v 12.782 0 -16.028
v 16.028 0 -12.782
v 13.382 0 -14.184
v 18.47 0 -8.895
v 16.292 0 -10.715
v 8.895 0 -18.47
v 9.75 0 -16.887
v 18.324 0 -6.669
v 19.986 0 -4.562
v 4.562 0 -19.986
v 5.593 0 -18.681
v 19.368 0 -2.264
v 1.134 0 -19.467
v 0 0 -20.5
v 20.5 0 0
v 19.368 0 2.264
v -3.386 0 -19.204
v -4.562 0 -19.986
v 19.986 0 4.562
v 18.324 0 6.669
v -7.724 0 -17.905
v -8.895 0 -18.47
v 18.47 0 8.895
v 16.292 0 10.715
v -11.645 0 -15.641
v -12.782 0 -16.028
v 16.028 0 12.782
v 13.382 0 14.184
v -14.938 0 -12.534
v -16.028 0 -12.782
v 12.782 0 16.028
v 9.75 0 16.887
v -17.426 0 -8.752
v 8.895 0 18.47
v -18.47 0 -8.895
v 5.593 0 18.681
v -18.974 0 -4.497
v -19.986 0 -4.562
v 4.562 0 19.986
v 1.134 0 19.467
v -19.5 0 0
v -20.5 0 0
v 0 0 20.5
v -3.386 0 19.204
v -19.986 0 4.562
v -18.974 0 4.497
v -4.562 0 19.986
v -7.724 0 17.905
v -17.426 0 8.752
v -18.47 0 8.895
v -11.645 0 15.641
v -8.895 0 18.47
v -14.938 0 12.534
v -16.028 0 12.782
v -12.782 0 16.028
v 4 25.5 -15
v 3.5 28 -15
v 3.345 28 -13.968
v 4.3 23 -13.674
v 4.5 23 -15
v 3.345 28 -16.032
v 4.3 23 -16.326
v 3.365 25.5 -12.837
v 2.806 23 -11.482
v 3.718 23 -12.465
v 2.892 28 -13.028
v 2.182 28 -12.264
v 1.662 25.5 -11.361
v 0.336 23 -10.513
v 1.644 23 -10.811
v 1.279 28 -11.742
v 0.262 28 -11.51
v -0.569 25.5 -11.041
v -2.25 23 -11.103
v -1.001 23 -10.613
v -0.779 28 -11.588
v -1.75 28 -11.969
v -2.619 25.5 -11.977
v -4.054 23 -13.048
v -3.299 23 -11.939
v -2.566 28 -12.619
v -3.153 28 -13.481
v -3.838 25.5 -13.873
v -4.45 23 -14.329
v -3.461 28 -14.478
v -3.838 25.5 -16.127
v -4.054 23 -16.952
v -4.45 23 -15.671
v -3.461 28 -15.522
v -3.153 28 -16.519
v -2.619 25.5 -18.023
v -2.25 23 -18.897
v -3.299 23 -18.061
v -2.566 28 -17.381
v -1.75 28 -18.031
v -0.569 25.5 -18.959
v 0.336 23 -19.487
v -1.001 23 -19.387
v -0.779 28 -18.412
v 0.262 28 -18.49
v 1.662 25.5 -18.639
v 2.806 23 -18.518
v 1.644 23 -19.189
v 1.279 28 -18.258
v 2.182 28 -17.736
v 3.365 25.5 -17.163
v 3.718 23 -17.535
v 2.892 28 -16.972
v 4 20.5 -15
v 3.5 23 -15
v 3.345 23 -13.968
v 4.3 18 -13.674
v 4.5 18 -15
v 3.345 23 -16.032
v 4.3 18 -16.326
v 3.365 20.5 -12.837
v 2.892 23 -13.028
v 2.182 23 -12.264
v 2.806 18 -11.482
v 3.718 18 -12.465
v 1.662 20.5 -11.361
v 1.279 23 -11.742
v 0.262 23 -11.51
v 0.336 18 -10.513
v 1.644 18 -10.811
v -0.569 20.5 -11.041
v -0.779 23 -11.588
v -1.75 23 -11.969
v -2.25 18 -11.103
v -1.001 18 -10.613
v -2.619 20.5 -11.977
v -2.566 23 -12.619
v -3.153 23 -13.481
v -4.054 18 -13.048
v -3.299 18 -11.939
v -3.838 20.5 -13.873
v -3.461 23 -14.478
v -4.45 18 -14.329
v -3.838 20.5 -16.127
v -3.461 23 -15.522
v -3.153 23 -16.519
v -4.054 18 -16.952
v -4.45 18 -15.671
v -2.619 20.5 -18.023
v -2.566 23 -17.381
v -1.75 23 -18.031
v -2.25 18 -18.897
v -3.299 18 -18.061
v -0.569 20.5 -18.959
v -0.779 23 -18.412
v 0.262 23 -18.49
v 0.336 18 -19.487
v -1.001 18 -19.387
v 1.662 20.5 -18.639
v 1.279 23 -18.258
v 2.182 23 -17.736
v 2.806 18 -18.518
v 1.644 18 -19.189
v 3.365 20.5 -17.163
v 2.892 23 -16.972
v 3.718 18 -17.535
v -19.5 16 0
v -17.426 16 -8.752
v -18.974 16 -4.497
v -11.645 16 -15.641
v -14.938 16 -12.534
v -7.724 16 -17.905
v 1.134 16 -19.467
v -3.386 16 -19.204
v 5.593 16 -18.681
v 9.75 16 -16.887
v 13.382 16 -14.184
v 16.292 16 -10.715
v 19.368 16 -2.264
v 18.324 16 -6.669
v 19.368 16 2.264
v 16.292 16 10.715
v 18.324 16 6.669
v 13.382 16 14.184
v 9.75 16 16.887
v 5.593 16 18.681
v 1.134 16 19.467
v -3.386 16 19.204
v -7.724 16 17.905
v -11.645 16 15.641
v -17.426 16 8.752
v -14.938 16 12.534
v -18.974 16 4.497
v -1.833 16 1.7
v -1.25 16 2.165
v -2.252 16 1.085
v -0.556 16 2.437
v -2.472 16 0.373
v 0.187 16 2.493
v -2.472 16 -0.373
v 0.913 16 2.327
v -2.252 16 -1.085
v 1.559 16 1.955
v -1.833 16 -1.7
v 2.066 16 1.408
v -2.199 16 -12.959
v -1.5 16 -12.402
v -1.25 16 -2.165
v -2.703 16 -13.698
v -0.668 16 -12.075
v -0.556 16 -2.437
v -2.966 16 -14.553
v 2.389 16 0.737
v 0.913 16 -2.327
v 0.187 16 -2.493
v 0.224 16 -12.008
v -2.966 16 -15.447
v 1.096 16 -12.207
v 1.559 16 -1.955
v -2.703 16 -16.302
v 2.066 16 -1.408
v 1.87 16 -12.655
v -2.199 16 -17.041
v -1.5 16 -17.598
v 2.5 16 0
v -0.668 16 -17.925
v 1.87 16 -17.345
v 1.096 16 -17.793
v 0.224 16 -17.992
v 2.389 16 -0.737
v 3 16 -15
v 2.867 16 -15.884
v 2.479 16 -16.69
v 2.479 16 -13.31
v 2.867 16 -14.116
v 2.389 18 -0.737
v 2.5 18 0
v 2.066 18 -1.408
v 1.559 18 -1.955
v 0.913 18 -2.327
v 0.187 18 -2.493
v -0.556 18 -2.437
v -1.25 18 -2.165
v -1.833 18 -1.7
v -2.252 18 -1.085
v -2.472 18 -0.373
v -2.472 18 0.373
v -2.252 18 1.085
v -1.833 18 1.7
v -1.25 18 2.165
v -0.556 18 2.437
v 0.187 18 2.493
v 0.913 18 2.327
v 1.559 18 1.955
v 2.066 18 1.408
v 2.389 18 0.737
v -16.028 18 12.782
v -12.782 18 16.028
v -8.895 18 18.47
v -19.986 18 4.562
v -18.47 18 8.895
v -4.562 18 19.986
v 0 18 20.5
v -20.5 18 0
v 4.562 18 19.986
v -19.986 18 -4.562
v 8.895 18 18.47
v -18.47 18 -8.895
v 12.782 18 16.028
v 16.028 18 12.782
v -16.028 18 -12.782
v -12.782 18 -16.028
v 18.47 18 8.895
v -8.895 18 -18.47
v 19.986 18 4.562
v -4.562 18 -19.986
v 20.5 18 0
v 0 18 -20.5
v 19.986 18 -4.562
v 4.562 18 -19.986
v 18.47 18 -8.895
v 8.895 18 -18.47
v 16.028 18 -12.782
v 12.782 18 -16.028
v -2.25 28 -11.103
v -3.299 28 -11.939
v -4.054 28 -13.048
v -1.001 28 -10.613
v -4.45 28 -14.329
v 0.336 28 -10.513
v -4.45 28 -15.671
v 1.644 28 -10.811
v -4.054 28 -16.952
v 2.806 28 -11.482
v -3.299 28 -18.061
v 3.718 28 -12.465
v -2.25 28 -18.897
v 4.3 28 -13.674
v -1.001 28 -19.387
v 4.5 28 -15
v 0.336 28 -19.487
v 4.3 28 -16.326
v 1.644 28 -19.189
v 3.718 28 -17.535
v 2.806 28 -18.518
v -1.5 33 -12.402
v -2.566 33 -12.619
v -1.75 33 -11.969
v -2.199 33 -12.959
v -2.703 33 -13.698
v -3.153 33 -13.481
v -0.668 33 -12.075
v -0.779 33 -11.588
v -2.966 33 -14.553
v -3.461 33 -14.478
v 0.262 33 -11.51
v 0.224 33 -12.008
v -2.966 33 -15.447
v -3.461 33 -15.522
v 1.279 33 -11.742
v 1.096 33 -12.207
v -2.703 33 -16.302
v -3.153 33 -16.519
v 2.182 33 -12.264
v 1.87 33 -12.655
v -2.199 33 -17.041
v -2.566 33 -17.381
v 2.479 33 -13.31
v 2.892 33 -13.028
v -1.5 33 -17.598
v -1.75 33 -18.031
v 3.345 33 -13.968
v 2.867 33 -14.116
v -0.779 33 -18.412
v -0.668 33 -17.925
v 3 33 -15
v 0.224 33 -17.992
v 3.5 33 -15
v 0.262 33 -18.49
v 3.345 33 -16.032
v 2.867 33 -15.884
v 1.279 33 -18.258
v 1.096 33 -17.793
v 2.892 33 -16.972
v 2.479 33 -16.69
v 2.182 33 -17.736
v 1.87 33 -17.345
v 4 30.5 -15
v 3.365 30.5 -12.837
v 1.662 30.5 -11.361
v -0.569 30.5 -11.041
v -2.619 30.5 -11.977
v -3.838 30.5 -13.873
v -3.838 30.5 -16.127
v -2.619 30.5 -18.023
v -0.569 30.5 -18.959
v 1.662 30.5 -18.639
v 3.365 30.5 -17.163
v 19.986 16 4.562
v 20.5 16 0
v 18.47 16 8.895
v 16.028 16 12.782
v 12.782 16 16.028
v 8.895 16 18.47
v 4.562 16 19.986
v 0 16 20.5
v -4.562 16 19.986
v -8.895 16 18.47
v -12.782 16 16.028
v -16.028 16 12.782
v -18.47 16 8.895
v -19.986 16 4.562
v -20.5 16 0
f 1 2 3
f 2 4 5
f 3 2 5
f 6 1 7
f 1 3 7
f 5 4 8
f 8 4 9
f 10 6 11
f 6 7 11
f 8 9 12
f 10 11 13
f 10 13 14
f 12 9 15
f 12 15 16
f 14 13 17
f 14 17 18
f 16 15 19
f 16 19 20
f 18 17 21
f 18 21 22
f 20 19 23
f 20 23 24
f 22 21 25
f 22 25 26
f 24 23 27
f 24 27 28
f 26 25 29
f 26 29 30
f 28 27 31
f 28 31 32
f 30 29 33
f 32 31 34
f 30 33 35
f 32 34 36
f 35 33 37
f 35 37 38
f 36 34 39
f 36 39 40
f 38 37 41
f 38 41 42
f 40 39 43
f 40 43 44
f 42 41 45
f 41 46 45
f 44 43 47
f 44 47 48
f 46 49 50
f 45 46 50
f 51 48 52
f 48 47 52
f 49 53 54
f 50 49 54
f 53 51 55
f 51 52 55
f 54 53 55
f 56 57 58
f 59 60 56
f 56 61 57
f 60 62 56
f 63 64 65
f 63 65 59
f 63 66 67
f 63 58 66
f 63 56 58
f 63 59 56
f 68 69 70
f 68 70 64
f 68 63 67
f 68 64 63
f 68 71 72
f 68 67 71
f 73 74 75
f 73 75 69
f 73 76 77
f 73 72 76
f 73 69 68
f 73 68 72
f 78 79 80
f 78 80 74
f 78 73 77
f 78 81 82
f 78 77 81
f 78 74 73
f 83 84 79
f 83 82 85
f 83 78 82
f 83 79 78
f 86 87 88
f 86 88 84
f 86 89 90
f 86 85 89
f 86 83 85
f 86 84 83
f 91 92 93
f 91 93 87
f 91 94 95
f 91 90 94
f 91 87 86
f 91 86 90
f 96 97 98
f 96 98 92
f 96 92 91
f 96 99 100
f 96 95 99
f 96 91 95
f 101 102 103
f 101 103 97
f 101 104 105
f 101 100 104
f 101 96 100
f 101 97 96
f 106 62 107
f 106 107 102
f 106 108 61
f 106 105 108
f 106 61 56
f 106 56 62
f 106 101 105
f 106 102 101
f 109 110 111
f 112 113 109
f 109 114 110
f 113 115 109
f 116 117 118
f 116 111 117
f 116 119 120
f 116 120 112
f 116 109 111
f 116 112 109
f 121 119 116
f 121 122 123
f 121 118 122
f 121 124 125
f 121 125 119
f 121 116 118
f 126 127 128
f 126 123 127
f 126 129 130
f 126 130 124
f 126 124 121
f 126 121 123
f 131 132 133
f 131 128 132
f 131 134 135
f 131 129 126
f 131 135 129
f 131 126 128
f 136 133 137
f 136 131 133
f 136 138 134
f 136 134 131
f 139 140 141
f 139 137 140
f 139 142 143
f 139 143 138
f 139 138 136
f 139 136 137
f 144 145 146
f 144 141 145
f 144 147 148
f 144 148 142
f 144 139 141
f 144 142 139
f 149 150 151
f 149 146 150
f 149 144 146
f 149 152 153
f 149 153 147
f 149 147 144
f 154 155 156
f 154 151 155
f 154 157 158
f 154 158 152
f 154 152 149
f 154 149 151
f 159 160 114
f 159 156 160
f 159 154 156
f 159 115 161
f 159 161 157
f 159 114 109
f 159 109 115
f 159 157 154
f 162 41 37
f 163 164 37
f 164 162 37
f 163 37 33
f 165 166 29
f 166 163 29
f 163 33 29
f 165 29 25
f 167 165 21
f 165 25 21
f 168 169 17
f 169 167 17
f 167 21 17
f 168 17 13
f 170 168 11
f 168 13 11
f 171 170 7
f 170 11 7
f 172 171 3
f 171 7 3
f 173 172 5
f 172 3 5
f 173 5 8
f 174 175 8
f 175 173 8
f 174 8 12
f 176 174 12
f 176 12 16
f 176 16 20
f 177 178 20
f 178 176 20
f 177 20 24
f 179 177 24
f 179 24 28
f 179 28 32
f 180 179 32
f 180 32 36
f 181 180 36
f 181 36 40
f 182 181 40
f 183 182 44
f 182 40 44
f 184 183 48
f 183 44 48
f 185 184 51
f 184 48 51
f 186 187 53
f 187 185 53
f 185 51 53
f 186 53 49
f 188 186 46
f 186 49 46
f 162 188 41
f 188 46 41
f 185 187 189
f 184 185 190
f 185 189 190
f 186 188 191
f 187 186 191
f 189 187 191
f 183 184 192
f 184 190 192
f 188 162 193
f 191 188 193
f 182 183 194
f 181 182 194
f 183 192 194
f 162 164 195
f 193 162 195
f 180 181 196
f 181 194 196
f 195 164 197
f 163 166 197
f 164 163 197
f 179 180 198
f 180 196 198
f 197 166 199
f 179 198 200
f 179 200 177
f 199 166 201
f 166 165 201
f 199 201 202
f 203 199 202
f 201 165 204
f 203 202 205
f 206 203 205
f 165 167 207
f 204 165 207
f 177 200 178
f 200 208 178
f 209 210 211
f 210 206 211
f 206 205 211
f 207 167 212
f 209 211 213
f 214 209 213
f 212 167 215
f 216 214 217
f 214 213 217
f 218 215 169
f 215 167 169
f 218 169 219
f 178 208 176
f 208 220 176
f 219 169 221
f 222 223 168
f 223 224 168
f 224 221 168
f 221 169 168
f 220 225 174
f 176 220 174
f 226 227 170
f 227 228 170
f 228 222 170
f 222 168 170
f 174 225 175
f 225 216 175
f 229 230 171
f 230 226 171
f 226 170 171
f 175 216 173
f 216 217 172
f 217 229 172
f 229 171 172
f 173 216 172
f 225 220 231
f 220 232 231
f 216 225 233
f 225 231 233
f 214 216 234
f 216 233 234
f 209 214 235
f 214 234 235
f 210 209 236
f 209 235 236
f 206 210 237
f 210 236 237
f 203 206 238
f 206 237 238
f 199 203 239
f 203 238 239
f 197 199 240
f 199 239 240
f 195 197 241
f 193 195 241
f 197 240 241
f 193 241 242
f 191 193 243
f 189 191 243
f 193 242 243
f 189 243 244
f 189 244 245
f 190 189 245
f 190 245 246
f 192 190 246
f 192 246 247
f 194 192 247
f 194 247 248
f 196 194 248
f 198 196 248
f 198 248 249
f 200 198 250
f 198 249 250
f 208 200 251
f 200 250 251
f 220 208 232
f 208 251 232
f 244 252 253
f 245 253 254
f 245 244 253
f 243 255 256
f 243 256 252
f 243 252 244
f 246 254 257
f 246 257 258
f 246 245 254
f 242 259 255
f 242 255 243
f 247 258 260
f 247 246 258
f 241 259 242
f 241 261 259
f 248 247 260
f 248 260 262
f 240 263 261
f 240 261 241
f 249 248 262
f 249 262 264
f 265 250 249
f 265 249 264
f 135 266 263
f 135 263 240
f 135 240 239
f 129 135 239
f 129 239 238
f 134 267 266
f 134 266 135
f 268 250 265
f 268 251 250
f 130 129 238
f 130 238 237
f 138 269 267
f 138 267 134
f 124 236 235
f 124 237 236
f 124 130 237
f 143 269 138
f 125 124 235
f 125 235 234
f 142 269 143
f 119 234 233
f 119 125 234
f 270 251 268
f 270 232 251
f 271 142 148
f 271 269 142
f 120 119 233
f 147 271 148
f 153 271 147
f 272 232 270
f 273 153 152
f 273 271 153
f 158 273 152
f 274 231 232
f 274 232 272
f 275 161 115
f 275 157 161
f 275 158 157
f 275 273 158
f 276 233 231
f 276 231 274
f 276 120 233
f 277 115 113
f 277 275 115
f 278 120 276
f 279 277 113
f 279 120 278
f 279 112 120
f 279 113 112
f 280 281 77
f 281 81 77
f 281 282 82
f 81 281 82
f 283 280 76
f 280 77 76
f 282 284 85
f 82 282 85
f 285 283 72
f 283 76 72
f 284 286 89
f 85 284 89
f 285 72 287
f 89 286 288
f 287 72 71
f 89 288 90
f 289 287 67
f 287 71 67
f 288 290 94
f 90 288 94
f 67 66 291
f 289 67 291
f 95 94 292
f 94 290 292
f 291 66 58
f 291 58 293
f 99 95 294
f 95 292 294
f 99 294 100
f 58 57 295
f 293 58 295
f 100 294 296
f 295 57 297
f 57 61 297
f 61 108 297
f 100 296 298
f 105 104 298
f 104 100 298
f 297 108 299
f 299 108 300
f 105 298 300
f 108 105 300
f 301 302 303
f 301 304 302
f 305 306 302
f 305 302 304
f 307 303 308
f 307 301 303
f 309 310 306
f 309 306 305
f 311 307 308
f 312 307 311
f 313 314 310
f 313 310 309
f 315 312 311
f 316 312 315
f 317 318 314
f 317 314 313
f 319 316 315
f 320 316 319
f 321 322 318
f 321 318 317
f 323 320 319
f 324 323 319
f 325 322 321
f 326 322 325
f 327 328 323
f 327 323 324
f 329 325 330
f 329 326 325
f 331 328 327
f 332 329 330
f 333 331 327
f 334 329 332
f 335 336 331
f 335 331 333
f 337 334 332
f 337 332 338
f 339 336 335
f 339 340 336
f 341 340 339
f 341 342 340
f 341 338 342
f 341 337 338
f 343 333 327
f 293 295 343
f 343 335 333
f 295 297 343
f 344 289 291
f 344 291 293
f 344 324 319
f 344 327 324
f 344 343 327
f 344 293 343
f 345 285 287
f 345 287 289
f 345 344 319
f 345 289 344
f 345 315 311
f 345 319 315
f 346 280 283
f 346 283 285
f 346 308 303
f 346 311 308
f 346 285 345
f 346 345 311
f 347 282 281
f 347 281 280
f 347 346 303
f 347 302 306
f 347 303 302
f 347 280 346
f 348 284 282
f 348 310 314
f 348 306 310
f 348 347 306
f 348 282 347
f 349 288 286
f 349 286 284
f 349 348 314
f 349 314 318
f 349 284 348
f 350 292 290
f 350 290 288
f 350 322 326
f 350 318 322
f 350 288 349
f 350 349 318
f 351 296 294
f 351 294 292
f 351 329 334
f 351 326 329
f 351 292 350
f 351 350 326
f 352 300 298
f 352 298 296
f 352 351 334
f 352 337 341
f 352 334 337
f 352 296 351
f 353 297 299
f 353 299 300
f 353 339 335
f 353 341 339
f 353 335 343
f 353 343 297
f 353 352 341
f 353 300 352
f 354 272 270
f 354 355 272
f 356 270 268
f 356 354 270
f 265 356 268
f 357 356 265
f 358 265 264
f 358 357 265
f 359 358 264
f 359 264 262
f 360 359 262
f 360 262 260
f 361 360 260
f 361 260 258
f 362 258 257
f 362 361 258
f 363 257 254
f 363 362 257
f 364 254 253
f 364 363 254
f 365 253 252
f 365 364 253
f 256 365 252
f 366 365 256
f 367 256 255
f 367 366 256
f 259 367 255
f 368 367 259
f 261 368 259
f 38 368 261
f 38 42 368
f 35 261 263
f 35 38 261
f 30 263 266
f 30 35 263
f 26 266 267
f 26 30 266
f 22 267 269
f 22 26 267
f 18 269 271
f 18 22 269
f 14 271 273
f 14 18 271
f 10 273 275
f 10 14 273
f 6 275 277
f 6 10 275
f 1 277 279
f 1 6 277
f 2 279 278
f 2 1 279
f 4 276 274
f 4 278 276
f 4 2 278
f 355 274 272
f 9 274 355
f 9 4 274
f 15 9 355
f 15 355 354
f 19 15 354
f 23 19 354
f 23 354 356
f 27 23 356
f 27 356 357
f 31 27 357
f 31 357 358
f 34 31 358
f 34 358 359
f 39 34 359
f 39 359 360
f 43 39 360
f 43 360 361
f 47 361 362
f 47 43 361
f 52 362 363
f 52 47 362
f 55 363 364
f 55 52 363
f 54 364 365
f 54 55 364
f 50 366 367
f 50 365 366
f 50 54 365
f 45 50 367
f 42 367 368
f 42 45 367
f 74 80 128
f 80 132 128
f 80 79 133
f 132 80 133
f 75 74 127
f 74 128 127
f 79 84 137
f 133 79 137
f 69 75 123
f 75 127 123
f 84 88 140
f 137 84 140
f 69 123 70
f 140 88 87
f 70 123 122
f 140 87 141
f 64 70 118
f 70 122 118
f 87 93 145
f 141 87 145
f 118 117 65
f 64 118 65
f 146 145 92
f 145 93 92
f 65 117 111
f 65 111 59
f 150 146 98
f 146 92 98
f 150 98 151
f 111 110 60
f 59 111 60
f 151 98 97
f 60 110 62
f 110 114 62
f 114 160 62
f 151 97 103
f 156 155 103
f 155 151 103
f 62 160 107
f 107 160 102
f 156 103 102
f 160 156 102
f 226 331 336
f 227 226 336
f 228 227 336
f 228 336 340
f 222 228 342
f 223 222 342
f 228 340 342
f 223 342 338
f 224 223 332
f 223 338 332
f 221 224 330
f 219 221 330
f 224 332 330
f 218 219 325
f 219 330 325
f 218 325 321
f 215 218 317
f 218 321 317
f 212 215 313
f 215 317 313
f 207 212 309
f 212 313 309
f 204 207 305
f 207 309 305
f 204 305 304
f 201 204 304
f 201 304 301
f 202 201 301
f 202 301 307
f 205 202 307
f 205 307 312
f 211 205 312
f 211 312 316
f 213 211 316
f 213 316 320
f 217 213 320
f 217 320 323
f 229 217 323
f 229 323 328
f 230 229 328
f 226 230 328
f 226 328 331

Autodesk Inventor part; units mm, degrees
ref_plane "YZ Plane" through (0, 0, 0) normal (1, 0, 0) x (0, 1, 0)
ref_plane "XZ Plane" through (0, 0, 0) normal (0, 1, 0) x (-1, 0, 0)
sketch "Sketch1" plane through (0, 0, 0) normal (0, 1, 0) x (-1, 0, 0)
  circle A0 centre (0, 0) radius 19.5
  circle A1 centre (0, 0) radius 20.5
  dimension "d0" = 39
  dimension "d1" = 41
extrude "Extrusion1" add sketch "Sketch1" along normal blind 16
thread "Thread1" size "M39x2" class "6H" standard "ANSI Metric M Profile" length 16
sketch "Sketch2" plane through (0, 16, 0) normal (0, 1, 0) x (1, 0, 0)
  circle A0 centre (0, 0) radius 20.5
  circle A1 centre (0, 0) radius 20.5 projected
extrude "Extrusion2" add sketch "Sketch2" along normal blind 2
sketch "Sketch3" plane through (0, 18, 0) normal (0, 1, 0) x (1, 0, 0)
  circle A0 centre (0, 0) radius 2.5
  dimension "d8" = 5
extrude "Extrusion3" cut sketch "Sketch3" against normal blind 2
sketch "Sketch4" plane through (0, 18, 0) normal (0, 1, 0) x (1, 0, 0)
  circle A0 centre (0, 15) radius 4.5
  point P0 (0, 0)
  dimension "d13" = 9
  dimension "d14" = 15
ref_plane "Work Plane1" through (0, 23, 0) normal (0, 1, 0) x (1, 0, 0)
sketch "Sketch5" plane through (0, 23, 0) normal (0, 1, 0) x (1, 0, 0)
  circle A0 centre (0, 15) radius 3.5
  point P0 (0, 0)
  dimension "d16" = 7
loft "Loft1" add profiles "Sketch4", "Sketch5"
pattern_linear "Rectangular Pattern2" count 3 spacing 5 along (0, 1, 0) of "Loft1"
sketch "Sketch9" plane through (0, 33, -15) normal (0, 1, 0) x (1, 0, 0)
  circle A0 centre (0, 0) radius 3
  circle A1 centre (0, 0) radius 3.5 projected
  point P0 (0, -15)
  dimension "d33" = 6
extrude "Extrusion5" cut sketch "Sketch9" against normal through all contours A0
properties part number "Cap" material "PPS Plastic"
